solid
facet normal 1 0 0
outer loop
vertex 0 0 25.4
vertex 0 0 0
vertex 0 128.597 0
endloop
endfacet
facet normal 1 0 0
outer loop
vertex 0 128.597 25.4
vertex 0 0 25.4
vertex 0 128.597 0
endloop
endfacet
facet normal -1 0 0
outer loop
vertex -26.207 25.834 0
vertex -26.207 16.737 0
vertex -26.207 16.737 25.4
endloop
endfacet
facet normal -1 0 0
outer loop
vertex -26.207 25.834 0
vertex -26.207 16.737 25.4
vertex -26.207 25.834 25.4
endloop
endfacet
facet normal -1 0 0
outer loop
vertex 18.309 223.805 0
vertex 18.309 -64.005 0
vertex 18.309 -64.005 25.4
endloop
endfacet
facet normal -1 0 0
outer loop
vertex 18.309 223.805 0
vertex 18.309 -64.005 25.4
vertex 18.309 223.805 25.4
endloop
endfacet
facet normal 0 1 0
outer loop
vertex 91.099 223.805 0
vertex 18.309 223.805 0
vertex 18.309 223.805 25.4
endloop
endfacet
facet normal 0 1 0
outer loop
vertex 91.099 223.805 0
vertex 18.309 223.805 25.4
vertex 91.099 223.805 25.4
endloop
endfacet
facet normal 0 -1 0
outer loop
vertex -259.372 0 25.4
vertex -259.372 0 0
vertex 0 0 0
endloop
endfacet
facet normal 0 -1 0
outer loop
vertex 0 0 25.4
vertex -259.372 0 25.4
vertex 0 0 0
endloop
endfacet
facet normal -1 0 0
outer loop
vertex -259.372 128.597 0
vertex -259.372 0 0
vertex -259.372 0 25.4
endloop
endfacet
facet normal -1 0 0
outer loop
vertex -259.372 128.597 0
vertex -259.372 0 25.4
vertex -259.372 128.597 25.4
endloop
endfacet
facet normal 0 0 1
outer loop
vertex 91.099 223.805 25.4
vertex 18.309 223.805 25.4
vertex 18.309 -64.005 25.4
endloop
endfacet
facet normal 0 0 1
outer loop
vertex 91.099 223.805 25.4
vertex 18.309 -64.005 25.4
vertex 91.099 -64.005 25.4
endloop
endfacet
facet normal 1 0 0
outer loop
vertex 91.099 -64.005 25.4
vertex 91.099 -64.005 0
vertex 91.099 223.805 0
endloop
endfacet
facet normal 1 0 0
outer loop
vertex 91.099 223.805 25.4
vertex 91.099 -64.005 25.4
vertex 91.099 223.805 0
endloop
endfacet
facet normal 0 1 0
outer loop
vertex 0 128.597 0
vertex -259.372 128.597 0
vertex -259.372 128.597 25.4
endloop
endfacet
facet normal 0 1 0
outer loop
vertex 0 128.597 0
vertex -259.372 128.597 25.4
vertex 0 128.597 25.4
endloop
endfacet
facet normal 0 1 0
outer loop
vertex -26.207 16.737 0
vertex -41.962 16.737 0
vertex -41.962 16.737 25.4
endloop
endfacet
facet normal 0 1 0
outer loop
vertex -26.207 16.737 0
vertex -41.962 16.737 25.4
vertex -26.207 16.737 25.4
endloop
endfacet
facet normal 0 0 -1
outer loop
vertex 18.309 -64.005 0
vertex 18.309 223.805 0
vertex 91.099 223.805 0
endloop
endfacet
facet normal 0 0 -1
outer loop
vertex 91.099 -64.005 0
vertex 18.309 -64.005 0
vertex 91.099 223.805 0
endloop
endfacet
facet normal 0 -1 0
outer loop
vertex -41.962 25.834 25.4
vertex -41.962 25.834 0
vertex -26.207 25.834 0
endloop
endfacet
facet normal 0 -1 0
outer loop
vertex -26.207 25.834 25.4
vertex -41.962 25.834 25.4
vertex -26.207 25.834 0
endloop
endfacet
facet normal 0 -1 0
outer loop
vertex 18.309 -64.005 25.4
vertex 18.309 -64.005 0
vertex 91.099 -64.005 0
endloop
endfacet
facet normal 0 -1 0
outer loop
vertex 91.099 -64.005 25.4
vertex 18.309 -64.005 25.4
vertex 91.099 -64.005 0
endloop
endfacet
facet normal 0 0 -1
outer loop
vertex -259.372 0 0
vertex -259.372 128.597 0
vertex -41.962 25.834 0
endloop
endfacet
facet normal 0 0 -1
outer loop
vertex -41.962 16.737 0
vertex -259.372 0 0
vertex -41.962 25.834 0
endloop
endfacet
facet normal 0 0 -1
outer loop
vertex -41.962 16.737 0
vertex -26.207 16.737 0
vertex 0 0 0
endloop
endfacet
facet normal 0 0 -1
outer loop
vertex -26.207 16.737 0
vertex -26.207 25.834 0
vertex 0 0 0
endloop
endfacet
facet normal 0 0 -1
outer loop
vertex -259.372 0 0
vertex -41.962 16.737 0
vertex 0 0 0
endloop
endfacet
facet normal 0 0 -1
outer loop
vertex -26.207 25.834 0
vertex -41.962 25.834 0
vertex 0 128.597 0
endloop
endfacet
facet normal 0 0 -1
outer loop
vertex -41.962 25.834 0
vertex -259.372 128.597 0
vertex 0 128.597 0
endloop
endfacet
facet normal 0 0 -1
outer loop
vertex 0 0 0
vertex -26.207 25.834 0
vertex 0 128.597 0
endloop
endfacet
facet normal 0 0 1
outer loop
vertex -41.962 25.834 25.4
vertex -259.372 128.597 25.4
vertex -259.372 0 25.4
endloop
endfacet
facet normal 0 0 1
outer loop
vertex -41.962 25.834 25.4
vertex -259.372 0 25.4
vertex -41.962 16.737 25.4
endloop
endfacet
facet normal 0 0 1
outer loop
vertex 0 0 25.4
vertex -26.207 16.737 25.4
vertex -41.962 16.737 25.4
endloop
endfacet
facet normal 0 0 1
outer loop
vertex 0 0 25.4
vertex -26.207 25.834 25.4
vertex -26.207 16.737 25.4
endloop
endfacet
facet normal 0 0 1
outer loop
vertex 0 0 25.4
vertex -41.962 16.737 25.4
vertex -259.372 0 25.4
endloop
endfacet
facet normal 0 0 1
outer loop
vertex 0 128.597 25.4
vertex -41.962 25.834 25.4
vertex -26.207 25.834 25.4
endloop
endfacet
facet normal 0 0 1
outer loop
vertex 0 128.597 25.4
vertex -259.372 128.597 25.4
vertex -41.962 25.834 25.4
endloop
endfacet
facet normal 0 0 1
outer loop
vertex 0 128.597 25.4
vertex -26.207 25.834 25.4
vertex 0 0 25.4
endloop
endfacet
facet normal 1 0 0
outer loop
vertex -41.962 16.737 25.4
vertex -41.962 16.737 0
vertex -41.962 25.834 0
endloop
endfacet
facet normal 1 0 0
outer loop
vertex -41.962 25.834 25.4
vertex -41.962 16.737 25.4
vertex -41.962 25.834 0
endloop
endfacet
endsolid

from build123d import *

# Parameters (mm, degrees)
F0_W     = 259.372175
F0_H     = 128.597468
F0_W_2   = 15.755439
F0_H_2   = 9.096414
F0_W_3   = 72.790148
F0_H_3   = 287.810274
F1_DEPTH = 25.4


with BuildPart() as f1:
    # F0 (on Top) → F1 (new body)
    with BuildSketch(Plane.XY):
        with Locations((-129.686087, 64.298734)):
            Rectangle(F0_W, F0_H)
        with Locations((-34.084255, 21.285577)):
            Rectangle(F0_W_2, F0_H_2, mode=Mode.SUBTRACT)
        with Locations((54.704367, 79.900261)):
            Rectangle(F0_W_3, F0_H_3)
    extrude(amount=F1_DEPTH)


solid = f1.part
